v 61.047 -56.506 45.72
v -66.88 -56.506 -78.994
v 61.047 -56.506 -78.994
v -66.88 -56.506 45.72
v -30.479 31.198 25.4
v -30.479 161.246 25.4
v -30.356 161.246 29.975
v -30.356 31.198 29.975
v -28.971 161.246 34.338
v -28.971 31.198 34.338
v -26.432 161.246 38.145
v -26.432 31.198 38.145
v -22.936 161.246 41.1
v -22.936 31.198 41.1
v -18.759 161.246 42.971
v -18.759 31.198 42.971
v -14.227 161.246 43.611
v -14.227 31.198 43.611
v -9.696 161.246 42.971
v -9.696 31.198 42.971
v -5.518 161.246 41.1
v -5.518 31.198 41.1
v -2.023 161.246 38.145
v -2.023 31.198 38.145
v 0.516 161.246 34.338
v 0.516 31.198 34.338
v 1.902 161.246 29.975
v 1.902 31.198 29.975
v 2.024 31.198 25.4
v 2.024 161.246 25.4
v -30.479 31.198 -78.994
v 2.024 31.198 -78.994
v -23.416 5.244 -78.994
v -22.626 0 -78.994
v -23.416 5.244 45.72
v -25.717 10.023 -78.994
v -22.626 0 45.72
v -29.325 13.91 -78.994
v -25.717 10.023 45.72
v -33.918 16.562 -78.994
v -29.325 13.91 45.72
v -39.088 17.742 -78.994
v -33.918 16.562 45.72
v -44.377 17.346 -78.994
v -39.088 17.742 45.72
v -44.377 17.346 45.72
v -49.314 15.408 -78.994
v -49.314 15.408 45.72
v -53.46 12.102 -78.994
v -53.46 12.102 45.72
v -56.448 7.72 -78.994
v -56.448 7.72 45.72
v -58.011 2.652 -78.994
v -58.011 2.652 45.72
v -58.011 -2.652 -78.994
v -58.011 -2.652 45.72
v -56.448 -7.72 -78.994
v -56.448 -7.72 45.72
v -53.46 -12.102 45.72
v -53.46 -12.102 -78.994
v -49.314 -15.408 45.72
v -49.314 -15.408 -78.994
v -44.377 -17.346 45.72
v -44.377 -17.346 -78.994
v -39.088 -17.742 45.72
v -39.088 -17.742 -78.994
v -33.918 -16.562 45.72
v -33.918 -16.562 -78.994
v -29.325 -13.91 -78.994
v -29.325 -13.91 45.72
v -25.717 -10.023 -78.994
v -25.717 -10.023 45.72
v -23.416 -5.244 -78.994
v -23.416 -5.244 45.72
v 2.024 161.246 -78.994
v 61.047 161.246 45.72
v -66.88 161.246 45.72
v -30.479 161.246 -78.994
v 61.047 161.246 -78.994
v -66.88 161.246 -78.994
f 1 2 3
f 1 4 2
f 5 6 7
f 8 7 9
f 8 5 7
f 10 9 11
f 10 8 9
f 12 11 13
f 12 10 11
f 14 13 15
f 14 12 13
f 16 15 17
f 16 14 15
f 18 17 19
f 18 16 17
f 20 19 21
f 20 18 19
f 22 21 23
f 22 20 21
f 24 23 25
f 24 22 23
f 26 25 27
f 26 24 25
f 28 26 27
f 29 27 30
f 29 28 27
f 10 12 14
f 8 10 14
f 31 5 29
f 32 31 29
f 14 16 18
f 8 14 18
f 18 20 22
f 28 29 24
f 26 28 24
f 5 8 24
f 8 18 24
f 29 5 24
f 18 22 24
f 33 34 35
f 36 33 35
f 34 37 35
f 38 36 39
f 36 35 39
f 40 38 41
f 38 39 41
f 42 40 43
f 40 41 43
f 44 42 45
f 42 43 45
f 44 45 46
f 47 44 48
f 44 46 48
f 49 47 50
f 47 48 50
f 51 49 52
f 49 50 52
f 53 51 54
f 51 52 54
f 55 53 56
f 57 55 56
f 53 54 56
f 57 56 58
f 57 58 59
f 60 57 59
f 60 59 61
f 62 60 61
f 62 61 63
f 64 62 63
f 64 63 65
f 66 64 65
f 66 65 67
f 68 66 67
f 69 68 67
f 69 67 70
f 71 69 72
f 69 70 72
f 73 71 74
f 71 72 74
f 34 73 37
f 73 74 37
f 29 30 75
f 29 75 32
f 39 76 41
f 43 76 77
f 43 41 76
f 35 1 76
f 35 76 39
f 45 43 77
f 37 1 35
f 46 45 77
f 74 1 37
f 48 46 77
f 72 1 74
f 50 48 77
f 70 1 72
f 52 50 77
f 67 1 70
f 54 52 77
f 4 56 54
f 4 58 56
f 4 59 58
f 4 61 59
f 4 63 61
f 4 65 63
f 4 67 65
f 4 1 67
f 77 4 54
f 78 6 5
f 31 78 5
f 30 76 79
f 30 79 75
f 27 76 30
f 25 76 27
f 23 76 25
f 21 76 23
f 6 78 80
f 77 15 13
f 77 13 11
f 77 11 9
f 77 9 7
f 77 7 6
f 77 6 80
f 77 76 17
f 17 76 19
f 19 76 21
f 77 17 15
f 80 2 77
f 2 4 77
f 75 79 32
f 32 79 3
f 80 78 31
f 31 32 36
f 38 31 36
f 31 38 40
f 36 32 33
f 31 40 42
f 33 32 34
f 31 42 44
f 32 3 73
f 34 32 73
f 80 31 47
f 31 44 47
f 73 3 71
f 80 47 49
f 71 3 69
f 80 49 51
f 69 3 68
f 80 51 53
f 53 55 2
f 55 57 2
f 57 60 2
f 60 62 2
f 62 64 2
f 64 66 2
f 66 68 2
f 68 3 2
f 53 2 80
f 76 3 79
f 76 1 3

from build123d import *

# Parameters (mm, degrees)
F0_W     = 127.9261372983
F0_H     = 87.7036768943
F1_DEPTH = 45.72
F2_R     = 17.7920916597
F3_DEPTH = 45.72
F4_W     = 127.9261372983
F4_H     = 45.72
F4_R     = 16.3569276355
F5_DEPTH = 130.048
F6_DEPTH = 25.4
F7_DEPTH = 104.394


with BuildPart() as f1:
    # F0 (on Top) → F1 (new body)
    with BuildSketch(Plane.XY):
        with Locations((-2.9164496809, -12.6540614292)):
            Rectangle(F0_W, F0_H)
    extrude(amount=F1_DEPTH)

    # F2 (on face) → F3 (cut)
    with BuildSketch(Plane.XY.offset(45.72)):
        with Locations((-40.4178053141, 0)):
            Circle(F2_R)
    extrude(amount=-F3_DEPTH, mode=Mode.SUBTRACT)

    # F4 (on face) → F5 (join)
    with BuildSketch(Plane(origin=(0, 31.197777018, 0), x_dir=(-1, 0, 0), z_dir=(0, 1, 0))):
        with Locations((2.9164496809, 22.86)):
            Rectangle(F4_W, F4_H)
        with Locations((14.2273971344, 27.2544236794)):
            Circle(F4_R, mode=Mode.SUBTRACT)
    extrude(amount=F5_DEPTH)

    # F6 (cut): a face of the model
    f6_faces = [f1.faces().sort_by_distance(p)[0] for p in [
        (-1.528037409, 54.3088302233, 0),
    ]]
    extrude(f6_faces, amount=-F6_DEPTH, mode=Mode.SUBTRACT)

    # F7 (add): a face of the model
    f7_faces = [f1.faces().sort_by_distance(p)[0] for p in [
        (58.5211311066, 52.3699385708, 25.4),
    ]]
    extrude(f7_faces, amount=F7_DEPTH)


solid = f1.part
